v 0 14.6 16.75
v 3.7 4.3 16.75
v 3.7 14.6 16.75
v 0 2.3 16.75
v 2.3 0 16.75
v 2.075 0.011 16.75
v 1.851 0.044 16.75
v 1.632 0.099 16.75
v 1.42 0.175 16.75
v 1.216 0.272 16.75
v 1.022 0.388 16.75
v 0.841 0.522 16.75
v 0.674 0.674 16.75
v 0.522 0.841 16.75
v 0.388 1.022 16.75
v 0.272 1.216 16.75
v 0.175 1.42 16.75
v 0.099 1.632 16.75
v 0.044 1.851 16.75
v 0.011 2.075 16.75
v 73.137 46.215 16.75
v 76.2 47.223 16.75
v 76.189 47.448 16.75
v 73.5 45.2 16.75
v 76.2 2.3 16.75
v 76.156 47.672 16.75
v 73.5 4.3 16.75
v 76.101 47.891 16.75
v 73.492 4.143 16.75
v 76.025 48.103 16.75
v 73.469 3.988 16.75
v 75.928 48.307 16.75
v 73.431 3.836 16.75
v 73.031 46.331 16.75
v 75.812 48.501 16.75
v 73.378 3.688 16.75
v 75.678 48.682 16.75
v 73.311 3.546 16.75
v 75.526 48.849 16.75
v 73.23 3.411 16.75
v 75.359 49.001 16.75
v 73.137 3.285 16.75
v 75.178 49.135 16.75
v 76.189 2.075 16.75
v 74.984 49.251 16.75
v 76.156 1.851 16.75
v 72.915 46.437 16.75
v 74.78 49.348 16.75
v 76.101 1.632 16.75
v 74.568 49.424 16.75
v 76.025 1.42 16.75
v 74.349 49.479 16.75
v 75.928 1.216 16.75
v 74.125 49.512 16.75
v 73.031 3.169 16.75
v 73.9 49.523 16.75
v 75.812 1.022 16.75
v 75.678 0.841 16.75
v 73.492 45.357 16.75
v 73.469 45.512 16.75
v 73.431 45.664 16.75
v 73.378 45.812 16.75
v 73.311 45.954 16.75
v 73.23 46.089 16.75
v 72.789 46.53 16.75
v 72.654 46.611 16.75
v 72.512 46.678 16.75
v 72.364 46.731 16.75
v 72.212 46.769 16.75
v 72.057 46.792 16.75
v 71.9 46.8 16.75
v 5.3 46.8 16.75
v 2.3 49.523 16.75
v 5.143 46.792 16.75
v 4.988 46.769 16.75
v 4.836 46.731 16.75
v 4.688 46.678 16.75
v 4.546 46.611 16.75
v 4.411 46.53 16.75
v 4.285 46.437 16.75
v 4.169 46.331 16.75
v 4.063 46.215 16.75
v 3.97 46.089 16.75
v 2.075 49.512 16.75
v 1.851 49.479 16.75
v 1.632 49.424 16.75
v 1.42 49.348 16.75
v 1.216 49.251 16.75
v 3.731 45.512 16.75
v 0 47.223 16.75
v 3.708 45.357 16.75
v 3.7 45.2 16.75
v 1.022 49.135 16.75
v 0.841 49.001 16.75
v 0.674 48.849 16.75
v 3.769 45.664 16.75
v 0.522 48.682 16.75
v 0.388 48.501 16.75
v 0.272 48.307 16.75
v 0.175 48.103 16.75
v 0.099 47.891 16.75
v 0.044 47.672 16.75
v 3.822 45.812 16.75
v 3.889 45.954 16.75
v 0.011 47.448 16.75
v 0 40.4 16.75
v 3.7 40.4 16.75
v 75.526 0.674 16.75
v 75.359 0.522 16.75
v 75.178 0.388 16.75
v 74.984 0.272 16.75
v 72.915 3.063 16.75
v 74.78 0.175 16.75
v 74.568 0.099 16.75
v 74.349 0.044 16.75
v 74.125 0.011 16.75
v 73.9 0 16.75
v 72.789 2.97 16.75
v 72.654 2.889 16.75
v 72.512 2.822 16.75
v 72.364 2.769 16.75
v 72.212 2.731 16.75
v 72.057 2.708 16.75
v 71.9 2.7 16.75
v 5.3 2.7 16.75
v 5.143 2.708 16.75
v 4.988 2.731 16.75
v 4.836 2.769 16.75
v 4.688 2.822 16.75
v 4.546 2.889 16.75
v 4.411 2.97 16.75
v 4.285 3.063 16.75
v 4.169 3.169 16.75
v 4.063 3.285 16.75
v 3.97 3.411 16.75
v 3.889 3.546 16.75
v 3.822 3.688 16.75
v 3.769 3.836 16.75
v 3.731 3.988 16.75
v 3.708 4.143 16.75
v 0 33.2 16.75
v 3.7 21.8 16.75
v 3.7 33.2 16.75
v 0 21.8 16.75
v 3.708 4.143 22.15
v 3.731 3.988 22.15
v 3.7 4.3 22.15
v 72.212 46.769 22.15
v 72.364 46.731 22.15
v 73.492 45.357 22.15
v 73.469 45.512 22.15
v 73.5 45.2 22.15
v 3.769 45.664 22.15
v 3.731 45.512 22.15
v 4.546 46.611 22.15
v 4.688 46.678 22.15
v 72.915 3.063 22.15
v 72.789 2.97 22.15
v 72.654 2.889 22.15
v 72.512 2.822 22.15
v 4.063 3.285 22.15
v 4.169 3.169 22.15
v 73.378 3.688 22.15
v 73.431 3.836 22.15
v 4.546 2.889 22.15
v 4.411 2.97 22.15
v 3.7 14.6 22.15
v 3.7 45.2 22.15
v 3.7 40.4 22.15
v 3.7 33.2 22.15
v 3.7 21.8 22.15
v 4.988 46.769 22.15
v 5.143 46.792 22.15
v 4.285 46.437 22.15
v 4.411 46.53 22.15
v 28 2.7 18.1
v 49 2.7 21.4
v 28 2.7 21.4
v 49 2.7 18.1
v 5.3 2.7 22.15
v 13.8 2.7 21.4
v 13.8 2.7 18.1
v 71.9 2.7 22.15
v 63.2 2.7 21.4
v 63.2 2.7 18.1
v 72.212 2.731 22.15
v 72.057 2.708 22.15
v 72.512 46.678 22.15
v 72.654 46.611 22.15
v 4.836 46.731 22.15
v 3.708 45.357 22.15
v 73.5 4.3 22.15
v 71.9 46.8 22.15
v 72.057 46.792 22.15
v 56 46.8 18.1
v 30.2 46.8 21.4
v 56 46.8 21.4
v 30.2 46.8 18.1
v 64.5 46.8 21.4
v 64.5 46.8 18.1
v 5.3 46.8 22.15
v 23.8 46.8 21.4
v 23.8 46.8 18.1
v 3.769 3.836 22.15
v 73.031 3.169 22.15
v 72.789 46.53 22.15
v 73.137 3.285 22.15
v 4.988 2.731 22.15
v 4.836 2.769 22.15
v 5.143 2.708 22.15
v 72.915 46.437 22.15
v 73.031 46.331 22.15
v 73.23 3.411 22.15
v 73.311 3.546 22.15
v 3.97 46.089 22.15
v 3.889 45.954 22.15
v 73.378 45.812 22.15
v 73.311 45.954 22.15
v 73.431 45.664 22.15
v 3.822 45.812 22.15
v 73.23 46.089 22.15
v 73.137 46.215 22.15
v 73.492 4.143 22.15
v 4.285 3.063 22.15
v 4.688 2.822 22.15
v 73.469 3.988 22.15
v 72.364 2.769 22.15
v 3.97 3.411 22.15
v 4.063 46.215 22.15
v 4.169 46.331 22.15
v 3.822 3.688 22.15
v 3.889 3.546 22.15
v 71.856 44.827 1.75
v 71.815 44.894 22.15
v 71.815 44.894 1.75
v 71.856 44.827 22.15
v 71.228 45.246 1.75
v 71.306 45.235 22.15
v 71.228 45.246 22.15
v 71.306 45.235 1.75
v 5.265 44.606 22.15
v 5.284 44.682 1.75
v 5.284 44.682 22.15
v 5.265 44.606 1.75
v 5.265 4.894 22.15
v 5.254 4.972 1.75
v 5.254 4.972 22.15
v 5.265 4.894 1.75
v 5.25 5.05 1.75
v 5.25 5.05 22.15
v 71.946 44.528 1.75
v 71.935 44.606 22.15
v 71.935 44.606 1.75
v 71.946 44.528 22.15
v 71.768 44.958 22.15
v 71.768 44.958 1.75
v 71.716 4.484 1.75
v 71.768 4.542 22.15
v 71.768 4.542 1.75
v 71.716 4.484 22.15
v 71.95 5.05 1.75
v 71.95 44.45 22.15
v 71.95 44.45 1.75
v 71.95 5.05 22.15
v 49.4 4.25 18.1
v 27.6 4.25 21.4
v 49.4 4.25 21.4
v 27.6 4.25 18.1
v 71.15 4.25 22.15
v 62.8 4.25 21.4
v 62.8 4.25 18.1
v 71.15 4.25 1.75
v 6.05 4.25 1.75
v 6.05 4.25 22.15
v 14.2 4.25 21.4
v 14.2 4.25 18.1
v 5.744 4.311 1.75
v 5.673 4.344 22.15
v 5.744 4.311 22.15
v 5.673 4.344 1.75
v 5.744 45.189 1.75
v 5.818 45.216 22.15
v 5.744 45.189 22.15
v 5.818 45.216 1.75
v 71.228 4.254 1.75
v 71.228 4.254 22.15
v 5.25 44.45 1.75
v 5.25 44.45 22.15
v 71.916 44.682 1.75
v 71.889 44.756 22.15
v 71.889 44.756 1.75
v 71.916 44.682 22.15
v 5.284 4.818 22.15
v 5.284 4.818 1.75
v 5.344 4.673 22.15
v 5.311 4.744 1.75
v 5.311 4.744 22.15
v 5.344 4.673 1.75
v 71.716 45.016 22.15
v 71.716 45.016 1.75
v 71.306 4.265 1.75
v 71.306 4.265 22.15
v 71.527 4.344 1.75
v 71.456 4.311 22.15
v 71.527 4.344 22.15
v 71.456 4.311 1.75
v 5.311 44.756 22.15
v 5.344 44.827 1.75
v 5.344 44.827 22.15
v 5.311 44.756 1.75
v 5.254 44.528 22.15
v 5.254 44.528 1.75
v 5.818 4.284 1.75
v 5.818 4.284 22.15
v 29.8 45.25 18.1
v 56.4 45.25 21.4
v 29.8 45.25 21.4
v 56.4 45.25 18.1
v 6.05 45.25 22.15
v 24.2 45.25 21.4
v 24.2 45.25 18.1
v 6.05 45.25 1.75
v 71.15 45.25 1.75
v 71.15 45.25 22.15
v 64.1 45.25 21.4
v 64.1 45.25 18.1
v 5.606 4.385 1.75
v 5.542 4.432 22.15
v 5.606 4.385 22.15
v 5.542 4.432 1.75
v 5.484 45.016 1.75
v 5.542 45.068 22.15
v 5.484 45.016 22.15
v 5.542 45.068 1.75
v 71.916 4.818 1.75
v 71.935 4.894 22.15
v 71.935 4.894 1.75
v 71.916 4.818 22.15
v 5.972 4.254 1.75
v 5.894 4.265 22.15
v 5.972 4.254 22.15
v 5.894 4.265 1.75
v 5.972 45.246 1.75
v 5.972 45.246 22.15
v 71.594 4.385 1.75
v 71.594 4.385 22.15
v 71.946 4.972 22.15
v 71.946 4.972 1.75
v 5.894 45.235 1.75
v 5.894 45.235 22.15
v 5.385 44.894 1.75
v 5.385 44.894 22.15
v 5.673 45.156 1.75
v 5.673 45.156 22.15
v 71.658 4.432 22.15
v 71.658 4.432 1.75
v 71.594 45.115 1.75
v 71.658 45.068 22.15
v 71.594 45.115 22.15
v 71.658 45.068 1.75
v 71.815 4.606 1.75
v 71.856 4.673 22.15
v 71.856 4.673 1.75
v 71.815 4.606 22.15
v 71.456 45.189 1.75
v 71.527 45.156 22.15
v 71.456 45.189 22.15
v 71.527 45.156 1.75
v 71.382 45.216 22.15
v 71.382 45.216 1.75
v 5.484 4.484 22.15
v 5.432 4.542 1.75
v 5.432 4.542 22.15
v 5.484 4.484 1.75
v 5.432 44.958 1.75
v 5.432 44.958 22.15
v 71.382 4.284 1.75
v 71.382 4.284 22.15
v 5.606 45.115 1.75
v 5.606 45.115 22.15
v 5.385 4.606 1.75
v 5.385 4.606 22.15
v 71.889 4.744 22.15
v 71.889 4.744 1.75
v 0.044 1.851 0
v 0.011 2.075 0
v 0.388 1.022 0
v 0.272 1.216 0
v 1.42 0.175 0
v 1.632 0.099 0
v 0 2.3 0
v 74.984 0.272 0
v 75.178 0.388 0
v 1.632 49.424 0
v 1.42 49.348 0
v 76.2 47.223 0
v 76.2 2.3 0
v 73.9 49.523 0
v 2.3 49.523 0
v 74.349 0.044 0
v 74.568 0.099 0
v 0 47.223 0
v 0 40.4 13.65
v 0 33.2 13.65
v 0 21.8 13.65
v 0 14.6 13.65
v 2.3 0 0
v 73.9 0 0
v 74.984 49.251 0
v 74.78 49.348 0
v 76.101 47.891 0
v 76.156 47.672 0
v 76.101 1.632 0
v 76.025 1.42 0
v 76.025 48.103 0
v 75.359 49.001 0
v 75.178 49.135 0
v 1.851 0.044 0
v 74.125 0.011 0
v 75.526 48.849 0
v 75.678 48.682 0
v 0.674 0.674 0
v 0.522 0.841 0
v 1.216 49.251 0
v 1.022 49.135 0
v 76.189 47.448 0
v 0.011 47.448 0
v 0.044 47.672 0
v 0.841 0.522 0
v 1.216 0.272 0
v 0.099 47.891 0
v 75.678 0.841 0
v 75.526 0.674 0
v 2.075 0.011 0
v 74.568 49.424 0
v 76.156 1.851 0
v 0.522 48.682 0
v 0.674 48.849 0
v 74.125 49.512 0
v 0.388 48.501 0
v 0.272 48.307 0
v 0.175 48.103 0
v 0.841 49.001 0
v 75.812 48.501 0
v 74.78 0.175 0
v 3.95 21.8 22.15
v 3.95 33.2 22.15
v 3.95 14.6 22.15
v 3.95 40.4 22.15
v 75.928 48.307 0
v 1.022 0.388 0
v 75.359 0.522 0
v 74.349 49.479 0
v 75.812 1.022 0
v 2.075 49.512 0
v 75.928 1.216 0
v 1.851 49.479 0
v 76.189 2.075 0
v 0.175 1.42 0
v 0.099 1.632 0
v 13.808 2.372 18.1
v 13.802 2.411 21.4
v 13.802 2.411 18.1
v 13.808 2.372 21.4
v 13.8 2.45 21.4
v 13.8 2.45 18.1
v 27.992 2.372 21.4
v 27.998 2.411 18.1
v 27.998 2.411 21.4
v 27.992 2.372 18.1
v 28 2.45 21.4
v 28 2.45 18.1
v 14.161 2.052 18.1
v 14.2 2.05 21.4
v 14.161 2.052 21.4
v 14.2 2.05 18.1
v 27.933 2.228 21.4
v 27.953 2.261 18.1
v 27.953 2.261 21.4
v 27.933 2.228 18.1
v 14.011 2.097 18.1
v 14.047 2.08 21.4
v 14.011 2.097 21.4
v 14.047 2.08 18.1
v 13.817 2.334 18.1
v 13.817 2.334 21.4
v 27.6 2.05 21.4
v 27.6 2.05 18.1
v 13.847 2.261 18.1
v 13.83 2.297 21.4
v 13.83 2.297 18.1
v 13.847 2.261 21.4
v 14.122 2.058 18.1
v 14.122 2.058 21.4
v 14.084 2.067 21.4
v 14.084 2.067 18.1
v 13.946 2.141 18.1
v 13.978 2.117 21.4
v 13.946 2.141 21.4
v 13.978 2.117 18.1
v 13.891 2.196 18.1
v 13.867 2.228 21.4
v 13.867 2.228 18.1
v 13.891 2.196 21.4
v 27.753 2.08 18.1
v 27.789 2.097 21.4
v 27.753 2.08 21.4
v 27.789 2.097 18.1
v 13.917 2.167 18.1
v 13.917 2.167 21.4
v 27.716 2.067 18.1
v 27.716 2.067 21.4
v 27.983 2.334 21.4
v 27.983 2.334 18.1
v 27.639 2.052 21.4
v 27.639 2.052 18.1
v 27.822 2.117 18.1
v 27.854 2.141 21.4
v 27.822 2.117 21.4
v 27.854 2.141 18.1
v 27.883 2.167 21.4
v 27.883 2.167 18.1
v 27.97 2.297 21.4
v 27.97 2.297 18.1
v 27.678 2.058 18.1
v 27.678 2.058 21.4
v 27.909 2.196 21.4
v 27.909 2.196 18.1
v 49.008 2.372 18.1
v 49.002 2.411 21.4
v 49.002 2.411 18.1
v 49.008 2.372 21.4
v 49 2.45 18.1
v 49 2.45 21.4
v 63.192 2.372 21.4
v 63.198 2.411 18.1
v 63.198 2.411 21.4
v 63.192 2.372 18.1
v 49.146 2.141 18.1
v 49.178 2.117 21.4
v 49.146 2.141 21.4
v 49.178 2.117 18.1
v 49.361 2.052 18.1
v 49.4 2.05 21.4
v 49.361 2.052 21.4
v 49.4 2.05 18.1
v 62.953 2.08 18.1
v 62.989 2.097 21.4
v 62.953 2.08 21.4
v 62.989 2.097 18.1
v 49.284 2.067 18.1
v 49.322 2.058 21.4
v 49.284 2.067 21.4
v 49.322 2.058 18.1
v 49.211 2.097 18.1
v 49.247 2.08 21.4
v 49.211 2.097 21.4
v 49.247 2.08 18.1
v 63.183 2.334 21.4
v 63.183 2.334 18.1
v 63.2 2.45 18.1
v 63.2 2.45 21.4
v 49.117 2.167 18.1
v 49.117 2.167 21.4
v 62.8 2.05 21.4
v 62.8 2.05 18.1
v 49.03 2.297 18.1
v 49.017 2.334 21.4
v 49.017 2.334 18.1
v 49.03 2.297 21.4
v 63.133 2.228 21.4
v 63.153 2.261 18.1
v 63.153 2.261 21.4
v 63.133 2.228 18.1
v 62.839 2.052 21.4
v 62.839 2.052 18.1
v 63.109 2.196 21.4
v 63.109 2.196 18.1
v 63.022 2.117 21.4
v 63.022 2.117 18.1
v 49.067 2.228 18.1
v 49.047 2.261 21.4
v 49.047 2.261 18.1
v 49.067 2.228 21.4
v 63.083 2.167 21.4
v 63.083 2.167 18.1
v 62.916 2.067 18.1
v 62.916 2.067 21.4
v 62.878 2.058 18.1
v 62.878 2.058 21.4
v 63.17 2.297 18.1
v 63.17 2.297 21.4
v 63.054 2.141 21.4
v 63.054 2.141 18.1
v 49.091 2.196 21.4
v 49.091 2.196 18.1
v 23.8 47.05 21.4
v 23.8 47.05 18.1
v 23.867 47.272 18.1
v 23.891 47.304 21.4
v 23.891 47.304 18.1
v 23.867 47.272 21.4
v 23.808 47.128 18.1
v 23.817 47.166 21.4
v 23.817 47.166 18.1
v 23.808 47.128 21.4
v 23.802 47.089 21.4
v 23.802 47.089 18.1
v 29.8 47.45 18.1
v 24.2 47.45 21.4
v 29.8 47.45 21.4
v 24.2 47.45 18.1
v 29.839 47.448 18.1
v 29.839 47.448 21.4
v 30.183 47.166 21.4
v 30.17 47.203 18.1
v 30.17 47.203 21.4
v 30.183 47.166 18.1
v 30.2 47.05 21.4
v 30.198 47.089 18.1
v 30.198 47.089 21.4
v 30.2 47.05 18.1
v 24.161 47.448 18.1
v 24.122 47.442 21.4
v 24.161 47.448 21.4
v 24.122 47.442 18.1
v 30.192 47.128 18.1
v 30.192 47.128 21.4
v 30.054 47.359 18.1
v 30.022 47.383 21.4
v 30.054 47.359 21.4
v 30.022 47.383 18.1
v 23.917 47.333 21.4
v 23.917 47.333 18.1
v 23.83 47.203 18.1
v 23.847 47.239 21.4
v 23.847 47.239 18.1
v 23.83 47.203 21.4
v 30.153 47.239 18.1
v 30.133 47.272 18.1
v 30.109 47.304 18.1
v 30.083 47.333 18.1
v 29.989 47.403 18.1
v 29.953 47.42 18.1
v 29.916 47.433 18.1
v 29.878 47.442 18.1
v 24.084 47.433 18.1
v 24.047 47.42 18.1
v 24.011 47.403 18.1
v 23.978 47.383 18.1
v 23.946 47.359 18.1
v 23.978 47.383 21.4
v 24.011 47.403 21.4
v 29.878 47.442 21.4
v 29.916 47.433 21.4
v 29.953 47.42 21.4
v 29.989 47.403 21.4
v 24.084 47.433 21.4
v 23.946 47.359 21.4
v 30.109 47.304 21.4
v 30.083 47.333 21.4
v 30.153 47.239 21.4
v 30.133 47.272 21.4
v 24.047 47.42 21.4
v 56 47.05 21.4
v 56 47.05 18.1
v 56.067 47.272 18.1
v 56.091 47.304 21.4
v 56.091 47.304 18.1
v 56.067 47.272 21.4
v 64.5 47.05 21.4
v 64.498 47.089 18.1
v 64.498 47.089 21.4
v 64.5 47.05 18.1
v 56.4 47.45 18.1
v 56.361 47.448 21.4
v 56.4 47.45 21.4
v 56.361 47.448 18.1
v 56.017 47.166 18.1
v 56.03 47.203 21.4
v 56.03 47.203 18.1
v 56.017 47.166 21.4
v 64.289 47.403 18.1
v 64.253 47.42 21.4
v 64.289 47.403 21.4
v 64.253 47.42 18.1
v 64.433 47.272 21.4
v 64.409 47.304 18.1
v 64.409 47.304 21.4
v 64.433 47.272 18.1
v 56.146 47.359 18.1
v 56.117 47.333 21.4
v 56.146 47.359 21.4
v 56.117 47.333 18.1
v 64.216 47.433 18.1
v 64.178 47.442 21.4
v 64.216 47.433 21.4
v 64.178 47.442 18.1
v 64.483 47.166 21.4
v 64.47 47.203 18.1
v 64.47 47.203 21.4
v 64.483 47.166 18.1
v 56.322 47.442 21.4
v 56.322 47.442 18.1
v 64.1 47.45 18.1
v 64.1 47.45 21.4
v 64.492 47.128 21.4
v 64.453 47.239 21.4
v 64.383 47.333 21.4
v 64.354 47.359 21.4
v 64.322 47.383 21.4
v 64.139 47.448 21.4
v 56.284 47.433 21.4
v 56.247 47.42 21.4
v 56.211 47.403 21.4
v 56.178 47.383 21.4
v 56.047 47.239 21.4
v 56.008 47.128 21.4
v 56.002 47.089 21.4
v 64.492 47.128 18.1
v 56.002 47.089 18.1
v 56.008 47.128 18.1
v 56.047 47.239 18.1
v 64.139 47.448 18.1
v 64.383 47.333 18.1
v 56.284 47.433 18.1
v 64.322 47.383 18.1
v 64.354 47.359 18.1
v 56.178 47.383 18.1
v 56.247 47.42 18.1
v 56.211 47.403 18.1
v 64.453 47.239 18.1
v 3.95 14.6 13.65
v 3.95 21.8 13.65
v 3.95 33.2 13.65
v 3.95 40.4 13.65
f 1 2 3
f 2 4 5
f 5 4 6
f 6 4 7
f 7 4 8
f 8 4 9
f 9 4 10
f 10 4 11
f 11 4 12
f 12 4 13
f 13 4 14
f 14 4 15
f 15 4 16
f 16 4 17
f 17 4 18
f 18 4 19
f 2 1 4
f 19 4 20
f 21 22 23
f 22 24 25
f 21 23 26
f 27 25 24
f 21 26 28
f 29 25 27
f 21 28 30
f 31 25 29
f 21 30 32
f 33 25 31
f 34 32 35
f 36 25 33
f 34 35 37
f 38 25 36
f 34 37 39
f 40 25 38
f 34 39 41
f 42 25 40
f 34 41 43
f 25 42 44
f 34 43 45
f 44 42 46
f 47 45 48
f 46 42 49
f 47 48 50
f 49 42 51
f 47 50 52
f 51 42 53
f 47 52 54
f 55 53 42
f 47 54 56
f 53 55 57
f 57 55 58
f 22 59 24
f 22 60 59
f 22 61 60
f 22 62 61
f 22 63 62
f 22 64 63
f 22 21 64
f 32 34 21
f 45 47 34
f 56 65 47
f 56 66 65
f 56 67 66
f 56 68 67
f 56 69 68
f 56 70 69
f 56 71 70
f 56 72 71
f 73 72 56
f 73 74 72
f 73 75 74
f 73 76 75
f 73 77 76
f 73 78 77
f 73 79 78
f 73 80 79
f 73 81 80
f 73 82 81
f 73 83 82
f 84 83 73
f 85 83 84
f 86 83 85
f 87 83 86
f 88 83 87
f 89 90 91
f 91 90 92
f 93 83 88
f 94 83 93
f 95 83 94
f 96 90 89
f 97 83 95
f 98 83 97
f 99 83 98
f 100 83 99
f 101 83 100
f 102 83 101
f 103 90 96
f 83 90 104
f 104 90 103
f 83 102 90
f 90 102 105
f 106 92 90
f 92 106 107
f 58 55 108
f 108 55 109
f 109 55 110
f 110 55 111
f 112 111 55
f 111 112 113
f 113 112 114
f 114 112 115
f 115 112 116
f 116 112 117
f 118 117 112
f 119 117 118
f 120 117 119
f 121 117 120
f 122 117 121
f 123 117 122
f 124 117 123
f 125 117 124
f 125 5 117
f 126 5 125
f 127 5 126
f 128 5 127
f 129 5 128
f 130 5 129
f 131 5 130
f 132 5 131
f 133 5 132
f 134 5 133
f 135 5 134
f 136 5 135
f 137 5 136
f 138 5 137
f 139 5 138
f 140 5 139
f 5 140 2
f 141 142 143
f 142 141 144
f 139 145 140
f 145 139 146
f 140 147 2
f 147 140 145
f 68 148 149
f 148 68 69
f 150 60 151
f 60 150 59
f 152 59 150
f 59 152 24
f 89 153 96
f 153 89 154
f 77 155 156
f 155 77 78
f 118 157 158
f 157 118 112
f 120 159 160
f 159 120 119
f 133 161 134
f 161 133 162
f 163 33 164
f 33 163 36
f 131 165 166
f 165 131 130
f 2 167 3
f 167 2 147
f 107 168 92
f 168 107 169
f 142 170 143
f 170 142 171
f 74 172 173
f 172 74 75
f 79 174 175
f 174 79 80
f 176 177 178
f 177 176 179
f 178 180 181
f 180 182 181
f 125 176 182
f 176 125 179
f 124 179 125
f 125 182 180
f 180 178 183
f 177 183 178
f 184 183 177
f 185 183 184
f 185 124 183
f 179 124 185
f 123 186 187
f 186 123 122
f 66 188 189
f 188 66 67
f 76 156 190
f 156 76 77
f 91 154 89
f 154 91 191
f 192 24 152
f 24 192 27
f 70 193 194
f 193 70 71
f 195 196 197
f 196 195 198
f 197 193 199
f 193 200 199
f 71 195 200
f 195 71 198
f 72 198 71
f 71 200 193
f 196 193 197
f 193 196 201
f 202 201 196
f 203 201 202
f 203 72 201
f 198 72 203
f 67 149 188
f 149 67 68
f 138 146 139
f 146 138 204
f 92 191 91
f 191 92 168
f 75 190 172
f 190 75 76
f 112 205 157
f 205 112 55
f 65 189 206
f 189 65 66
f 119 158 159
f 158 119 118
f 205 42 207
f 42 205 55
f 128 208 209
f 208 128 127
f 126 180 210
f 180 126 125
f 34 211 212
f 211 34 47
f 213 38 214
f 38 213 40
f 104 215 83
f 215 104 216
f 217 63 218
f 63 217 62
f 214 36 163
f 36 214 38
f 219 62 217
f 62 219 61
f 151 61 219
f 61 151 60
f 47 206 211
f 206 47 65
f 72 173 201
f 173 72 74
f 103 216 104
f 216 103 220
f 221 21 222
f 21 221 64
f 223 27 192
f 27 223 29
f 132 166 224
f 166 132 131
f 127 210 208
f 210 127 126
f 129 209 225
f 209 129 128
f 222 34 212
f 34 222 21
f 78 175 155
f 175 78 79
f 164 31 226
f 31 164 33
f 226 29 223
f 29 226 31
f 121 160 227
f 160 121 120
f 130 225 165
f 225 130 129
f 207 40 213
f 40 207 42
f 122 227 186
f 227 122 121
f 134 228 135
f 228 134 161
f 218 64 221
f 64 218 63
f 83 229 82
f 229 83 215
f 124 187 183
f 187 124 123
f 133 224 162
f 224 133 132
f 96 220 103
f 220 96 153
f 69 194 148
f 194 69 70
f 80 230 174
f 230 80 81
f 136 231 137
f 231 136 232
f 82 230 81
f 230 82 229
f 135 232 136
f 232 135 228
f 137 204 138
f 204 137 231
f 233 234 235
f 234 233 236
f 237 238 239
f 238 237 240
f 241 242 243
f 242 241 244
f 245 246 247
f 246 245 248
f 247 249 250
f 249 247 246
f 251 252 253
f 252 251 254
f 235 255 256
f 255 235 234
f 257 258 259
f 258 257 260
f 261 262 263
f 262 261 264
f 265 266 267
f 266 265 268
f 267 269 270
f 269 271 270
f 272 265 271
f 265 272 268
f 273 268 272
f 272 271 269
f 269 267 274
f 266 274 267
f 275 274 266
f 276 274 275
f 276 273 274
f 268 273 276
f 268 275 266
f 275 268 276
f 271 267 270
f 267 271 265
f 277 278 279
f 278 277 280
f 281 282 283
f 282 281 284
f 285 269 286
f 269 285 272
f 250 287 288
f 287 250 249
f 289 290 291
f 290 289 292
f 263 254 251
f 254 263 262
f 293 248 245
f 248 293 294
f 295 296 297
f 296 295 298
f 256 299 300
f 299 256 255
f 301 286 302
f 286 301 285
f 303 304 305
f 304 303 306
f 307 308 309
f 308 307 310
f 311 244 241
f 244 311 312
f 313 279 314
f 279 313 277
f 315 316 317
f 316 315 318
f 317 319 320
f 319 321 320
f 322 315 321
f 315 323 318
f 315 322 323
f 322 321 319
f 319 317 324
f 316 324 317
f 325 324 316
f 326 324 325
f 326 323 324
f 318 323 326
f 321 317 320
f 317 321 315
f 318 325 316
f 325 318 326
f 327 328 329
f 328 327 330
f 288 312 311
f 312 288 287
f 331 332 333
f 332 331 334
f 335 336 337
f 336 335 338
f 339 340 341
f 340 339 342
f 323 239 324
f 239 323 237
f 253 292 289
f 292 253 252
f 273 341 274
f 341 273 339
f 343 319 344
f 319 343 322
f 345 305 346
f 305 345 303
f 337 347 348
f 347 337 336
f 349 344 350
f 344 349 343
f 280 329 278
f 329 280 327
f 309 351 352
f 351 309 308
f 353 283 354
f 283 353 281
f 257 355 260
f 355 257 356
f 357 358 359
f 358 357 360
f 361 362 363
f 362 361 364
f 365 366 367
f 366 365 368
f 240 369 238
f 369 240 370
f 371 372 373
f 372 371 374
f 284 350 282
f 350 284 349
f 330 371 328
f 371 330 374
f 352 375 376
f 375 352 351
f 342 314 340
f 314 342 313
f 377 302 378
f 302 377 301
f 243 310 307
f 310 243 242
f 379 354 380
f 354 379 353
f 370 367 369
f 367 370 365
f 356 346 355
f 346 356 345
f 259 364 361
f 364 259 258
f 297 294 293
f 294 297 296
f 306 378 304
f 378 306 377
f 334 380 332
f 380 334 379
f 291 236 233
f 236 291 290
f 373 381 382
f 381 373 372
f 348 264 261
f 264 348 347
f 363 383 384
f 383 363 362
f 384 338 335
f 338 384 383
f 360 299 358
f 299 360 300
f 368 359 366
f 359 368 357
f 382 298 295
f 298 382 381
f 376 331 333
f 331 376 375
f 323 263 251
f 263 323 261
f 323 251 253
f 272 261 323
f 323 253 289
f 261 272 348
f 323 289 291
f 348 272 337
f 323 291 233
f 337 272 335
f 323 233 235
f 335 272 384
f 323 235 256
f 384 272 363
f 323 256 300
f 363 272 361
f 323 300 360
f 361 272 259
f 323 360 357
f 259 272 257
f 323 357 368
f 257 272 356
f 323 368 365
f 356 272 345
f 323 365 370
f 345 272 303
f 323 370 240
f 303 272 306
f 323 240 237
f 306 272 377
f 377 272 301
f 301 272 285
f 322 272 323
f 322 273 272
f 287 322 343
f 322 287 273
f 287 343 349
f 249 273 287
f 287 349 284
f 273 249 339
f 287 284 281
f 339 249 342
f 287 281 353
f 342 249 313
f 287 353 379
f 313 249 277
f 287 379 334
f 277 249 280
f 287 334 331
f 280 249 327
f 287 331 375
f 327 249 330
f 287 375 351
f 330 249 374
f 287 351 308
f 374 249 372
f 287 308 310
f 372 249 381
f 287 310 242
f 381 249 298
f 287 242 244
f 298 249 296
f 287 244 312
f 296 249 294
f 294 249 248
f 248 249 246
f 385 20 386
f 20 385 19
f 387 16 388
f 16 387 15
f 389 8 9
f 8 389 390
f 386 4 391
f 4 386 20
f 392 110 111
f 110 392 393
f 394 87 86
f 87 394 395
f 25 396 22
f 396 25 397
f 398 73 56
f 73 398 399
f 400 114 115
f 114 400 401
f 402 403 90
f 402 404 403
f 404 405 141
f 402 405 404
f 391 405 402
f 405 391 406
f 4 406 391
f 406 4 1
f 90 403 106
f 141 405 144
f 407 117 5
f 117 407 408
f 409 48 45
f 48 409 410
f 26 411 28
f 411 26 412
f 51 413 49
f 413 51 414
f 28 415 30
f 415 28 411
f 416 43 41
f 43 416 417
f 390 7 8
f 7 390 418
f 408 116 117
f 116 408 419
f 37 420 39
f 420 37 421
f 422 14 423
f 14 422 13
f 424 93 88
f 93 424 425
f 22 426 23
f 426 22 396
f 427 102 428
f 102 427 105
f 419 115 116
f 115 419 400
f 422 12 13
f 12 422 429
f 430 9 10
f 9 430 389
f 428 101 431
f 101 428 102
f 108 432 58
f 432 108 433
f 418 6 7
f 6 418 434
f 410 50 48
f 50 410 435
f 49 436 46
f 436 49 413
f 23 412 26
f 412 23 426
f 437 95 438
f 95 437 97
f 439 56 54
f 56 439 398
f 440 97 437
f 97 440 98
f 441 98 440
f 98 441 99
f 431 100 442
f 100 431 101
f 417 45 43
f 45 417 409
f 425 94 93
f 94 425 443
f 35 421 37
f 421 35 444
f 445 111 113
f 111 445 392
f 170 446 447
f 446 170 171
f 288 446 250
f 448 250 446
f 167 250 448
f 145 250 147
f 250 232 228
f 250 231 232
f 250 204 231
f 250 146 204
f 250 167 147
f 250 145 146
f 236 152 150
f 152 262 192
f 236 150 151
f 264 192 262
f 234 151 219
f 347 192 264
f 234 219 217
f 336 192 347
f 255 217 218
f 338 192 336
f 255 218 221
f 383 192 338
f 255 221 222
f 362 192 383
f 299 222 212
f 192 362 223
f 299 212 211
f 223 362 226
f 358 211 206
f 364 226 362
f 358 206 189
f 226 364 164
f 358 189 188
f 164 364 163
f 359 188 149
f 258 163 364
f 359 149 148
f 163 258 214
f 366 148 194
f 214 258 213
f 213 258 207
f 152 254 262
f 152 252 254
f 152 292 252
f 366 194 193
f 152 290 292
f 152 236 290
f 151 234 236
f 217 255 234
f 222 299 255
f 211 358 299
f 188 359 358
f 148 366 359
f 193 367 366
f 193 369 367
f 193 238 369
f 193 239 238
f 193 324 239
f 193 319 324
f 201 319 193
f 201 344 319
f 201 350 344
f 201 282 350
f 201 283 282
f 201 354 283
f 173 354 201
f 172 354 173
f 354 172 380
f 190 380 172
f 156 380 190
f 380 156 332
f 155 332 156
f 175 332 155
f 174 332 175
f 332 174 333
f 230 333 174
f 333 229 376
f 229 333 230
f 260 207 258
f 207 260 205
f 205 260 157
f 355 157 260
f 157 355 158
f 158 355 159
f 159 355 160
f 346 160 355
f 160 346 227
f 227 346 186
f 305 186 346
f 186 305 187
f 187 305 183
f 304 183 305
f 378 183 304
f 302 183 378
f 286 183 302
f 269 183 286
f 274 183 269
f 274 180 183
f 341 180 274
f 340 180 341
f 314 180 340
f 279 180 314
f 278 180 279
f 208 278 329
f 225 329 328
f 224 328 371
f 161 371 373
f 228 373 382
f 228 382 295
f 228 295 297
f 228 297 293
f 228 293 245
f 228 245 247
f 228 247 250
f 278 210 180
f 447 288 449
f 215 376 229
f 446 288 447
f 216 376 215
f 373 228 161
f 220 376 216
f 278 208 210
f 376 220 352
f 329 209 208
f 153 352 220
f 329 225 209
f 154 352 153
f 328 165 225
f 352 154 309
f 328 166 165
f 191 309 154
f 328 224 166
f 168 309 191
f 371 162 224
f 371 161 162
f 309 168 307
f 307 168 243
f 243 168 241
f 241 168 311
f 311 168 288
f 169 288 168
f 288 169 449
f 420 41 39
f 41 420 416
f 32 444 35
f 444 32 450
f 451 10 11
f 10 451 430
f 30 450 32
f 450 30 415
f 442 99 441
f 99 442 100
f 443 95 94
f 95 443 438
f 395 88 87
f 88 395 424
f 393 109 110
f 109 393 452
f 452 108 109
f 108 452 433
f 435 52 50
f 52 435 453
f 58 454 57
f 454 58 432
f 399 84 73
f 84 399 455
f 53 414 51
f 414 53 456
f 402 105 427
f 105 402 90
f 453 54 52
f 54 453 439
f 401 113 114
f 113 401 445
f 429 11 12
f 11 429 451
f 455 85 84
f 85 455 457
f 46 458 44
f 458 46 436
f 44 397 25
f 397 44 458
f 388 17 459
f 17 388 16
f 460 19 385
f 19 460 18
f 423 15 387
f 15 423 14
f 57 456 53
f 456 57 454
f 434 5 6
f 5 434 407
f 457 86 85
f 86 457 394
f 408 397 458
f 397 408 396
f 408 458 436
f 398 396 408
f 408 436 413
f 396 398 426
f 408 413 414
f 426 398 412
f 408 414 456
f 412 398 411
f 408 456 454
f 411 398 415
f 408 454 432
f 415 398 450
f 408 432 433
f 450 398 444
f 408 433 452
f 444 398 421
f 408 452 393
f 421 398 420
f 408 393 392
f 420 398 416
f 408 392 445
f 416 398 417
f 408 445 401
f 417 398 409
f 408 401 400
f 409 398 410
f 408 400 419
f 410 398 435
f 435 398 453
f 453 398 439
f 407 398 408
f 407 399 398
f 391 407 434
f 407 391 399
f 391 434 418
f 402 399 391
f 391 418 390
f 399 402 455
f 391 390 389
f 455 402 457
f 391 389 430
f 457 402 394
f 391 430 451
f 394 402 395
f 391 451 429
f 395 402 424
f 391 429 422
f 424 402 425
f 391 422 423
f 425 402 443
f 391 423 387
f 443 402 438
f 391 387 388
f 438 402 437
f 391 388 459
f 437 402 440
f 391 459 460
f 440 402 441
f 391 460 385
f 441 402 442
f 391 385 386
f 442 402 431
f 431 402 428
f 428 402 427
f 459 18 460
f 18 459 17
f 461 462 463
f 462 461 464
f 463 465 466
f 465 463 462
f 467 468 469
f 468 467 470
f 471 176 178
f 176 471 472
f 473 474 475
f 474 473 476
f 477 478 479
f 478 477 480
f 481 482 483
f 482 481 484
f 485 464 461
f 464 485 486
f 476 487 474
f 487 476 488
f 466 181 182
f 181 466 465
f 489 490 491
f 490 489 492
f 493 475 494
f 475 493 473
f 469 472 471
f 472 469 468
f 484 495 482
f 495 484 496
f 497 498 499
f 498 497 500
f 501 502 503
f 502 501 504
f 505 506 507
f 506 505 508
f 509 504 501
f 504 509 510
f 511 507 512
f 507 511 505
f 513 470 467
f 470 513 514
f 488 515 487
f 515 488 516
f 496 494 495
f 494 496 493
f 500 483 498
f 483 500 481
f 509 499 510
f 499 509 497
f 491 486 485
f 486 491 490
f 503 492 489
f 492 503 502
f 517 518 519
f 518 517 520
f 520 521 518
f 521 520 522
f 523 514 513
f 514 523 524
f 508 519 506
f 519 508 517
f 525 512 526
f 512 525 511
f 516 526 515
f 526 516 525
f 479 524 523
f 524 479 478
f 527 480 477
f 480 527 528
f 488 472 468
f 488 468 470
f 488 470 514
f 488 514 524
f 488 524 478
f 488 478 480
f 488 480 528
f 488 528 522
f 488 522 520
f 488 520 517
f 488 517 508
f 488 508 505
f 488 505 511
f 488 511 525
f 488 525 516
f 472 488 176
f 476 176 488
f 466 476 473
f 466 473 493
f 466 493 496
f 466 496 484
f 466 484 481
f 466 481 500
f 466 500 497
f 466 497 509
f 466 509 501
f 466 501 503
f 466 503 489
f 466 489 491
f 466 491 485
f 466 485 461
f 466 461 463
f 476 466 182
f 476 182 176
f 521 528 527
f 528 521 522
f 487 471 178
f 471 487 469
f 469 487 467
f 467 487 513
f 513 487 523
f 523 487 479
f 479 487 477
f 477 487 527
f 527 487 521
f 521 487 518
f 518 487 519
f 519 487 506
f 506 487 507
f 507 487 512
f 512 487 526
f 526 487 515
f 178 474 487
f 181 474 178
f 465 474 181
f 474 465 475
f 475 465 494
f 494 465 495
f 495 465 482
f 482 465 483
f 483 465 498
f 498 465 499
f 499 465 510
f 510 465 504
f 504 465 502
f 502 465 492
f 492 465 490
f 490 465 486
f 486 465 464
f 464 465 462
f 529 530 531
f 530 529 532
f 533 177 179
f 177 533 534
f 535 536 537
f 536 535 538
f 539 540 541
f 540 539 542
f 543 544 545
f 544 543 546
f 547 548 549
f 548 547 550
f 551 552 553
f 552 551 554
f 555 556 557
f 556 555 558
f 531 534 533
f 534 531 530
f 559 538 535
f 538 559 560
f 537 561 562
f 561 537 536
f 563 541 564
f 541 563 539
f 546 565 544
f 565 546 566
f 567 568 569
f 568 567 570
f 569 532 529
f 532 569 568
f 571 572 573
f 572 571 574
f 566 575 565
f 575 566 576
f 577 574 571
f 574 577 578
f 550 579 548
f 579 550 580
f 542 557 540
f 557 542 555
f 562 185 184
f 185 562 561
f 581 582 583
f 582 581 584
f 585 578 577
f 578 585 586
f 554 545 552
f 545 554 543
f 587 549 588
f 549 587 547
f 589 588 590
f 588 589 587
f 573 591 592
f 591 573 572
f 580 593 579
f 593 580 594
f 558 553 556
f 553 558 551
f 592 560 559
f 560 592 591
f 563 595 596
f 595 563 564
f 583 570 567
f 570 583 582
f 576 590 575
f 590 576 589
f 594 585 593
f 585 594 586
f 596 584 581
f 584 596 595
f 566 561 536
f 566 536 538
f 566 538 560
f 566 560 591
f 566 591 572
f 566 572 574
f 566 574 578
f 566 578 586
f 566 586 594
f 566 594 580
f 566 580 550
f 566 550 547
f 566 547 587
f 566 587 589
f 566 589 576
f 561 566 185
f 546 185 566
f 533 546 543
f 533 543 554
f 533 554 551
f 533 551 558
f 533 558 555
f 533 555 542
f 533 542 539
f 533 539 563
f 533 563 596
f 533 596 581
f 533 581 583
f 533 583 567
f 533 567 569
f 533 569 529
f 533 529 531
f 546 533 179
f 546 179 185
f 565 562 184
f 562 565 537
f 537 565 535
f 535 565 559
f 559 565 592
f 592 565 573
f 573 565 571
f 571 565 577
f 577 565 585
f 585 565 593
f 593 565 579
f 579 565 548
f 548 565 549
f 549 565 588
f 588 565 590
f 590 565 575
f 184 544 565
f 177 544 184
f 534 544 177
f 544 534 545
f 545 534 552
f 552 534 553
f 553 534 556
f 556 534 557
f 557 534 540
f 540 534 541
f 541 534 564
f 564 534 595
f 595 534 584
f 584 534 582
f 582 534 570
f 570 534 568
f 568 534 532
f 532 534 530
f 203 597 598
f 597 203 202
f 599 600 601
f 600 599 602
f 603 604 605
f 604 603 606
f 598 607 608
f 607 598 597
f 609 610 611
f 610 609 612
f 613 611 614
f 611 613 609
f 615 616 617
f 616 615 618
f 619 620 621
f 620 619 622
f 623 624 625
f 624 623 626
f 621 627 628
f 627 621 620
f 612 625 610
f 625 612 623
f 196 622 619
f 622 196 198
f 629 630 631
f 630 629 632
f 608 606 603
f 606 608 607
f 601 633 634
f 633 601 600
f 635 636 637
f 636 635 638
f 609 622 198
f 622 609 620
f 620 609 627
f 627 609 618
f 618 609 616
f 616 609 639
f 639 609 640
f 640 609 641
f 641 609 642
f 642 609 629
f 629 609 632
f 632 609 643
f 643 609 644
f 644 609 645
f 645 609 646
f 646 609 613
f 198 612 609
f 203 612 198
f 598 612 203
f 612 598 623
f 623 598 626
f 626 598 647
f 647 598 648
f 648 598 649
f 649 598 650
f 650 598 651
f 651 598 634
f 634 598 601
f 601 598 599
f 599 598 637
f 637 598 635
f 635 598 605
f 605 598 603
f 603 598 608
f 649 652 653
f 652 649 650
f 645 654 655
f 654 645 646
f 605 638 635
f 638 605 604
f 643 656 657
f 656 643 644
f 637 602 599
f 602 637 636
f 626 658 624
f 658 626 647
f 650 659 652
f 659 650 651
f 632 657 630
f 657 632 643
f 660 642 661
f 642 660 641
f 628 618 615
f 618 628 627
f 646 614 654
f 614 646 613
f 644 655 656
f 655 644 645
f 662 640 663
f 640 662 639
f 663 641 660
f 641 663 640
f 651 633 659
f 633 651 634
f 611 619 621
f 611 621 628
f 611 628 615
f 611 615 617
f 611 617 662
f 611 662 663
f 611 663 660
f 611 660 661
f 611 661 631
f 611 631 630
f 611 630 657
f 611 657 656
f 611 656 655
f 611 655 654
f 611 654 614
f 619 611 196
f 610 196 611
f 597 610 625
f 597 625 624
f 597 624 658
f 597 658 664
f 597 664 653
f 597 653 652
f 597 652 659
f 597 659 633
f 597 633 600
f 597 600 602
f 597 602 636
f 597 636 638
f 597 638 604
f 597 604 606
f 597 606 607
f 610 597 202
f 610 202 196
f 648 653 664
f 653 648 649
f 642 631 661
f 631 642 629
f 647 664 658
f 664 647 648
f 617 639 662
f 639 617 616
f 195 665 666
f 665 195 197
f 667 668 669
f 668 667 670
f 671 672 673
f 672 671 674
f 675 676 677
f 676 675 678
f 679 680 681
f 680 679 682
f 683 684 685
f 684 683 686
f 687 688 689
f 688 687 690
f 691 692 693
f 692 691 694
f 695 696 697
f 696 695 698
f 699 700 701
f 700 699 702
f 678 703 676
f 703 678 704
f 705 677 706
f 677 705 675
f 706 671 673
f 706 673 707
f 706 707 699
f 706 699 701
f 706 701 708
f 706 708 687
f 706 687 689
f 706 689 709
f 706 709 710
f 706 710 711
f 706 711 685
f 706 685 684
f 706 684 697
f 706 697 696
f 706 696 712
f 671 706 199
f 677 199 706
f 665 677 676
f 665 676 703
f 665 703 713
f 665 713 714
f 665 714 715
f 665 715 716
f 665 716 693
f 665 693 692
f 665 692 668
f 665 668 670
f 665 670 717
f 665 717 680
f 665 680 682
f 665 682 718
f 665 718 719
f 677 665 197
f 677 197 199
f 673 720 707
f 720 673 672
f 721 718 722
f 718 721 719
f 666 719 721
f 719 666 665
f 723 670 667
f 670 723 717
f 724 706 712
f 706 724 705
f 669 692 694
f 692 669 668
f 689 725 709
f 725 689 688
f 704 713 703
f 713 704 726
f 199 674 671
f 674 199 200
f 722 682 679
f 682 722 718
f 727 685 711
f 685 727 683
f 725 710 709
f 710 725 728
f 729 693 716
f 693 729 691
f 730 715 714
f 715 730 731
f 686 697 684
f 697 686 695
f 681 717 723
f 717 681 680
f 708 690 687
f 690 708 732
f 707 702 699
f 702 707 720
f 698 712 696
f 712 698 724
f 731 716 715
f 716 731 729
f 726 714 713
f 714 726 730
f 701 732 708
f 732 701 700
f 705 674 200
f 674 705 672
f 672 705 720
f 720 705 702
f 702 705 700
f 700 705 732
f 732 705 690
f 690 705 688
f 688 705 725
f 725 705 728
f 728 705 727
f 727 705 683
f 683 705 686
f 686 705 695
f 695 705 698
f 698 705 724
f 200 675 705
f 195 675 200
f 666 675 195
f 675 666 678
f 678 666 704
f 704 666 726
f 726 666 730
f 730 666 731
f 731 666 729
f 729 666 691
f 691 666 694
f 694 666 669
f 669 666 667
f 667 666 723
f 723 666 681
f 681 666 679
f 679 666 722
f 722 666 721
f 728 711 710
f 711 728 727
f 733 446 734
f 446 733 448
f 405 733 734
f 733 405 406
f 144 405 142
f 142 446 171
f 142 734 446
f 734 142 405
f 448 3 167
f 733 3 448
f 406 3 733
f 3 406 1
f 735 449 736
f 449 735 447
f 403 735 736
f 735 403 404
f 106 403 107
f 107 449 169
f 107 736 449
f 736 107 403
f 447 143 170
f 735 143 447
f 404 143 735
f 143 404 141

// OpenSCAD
/**
 * TTGO-TM ESP32 ("TMusic") - BASE TRAY
 * Parametric constructive rebuild from ttgo-cap-2.stl.
 *
 * The source file uses "cap", but the part is the deep base tray. This model
 * starts with the overall rounded bounding block, removes the main cavity and
 * rim rabbet as named negative cutouts, and adds discrete support/lug blocks
 * observed in high-Z mesh cross-sections.
 *
 * Coordinate System:
 *   X = Width  (positive = right)
 *   Y = Depth  (positive = back/away from viewer)
 *   Z = Height (positive = up)
 *
 * Origin: Front-left-bottom corner of the normalized tray bounding box.
 *
 * ===========================================
 * COMPONENT INDEX
 * ===========================================
 *
 * | Component                     | Origin [X,Y,Z] | Size [W,D,H]        | Attaches To      |
 * |-------------------------------|----------------|---------------------|------------------|
 * | base_tray_outer_block         | [0,0,0]        | [76.2,49.523,22.15] | ground / print   |
 * | base_tray_inner_cavity        | [5.25,4.25,1.75]| [66.7,41.0,thru]   | negative cutout  |
 * | base_tray_rim_rabbet          | top perimeter  | 5.4 high            | bezel skirt      |
 * | support_lugs (x4)             | inner rim      | variable            | PCB / latch area |
 * | left_wall_connector_reliefs   | left wall      | variable            | negative cutout  |
 */

// ===========================================
// DIMENSIONS (all values in millimeters)
// ===========================================

// --- Source mesh facts ---
source_cap_mesh_file = "ttgo-cap-2.stl";
source_cap_bbox_min_mm = [-36.675, -44.4235, -20.290];
source_cap_bbox_max_mm = [ 39.525,   5.1000,   1.860];
source_cap_bbox_size_mm = [76.200, 49.5235, 22.150];
source_cap_face_count = 54112;

// --- Global / shared case dimensions ---
case_width_mm = 76.200;
case_depth_mm = 49.523;
case_corner_radius_mm = 2.300;
case_inner_corner_radius_mm = 0.800;
case_wall_thickness_mm = 2.500;
case_fit_clearance_xy_mm = 0.250;
case_fit_clearance_z_mm = 0.200;
case_epsilon_mm = 0.050;
case_cut_overshoot_mm = 0.500;

// --- base_tray_outer_block dimensions ---
base_tray_height_mm = 22.150;
base_tray_floor_thickness_mm = 1.750;

// --- base_tray_inner_cavity_cutout dimensions ---
base_tray_inner_cavity_x_mm = 5.250;
base_tray_inner_cavity_y_mm = 4.250;
base_tray_inner_cavity_width_mm = 66.700;
base_tray_inner_cavity_depth_mm = 41.000;

// --- base_tray_rim_rabbet_cutout dimensions ---
base_tray_rim_height_mm = 5.400;
base_tray_rim_inset_x_mm = 3.700;
base_tray_rim_inset_y_mm = 2.700;
base_tray_rim_width_mm = 69.800;
base_tray_rim_depth_mm = 44.100;
base_tray_rim_corner_radius_mm = 1.600;

// --- support_lugs dimensions ---
support_lug_height_mm = 3.300;
support_lug_z_mm = 18.100;
support_lug_depth_mm = 2.200;
support_lug_corner_radius_mm = 0.400;
front_support_lug_specs_mm = [
    [13.800, 14.200],
    [49.000, 14.200]
];
rear_support_lug_specs_mm = [
    [23.800,  6.400],
    [56.000,  8.500]
];

// --- left_wall_connector_relief_cutouts dimensions ---
left_wall_relief_x_mm = -case_epsilon_mm;
left_wall_relief_width_mm = 4.000;
left_wall_relief_height_mm = 8.500;
left_wall_relief_z_mm = base_tray_height_mm - left_wall_relief_height_mm;
left_wall_relief_depth_mm = 7.200;
left_wall_relief_centers_y_mm = [18.200, 36.800];

$fn = 64;

// ===========================================
// HELPERS
// ===========================================

module rounded_rect_2d(width_mm, depth_mm, radius_mm) {
    effective_radius_mm = min(radius_mm, min(width_mm, depth_mm) / 2);
    hull() {
        translate([effective_radius_mm, effective_radius_mm])
            circle(r = effective_radius_mm);
        translate([width_mm - effective_radius_mm, effective_radius_mm])
            circle(r = effective_radius_mm);
        translate([effective_radius_mm, depth_mm - effective_radius_mm])
            circle(r = effective_radius_mm);
        translate([width_mm - effective_radius_mm, depth_mm - effective_radius_mm])
            circle(r = effective_radius_mm);
    }
}

module rounded_box(width_mm, depth_mm, height_mm, radius_mm) {
    linear_extrude(height = height_mm)
        rounded_rect_2d(width_mm, depth_mm, radius_mm);
}

// ===========================================
// POSITIVE GEOMETRY
// ===========================================

/**
 * Base Tray Outer Block
 *
 * POSITION:
 *   Origin: [0,0,0]
 *
 * BOUNDING BOX:
 *   Min: [0,0,0]
 *   Max: [76.2,49.523,22.15]
 *
 * ALIGNMENT:
 *   The normalized source mesh bounding-box minimum maps to this origin.
 *
 * CONNECTS TO:
 *   - top bezel skirt through the rim rabbet.
 */
module base_tray_outer_block() {
    rounded_box(case_width_mm, case_depth_mm, base_tray_height_mm,
                case_corner_radius_mm);
}

/**
 * Base Tray Support Lugs
 *
 * POSITION:
 *   Four discrete raised blocks near the upper inner rim.
 *
 * BOUNDING BOX:
 *   z range: [18.1,21.4].
 *
 * ALIGNMENT:
 *   The blocks are added after the cavity/rabbet are cut so they remain as
 *   functional pads inside the tray.
 *
 * CONNECTS TO:
 *   - PCB edge / bezel latch region inferred from source sections.
 */
module base_tray_support_lugs_positive() {
    for (lug_spec = front_support_lug_specs_mm) {
        translate([lug_spec[0],
                   base_tray_inner_cavity_y_mm - support_lug_depth_mm,
                   support_lug_z_mm])
            rounded_box(lug_spec[1],
                        support_lug_depth_mm,
                        support_lug_height_mm,
                        support_lug_corner_radius_mm);
    }

    for (lug_spec = rear_support_lug_specs_mm) {
        translate([lug_spec[0],
                   base_tray_inner_cavity_y_mm + base_tray_inner_cavity_depth_mm,
                   support_lug_z_mm])
            rounded_box(lug_spec[1],
                        support_lug_depth_mm,
                        support_lug_height_mm,
                        support_lug_corner_radius_mm);
    }
}

// ===========================================
// NEGATIVE CUTOUTS
// ===========================================

module base_tray_shell_negative_cutouts() {
    base_tray_inner_cavity_cutout();
    base_tray_rim_rabbet_cutout();
}

module base_tray_final_negative_cutouts() {
    base_tray_left_wall_connector_relief_cutouts();
}

/**
 * Inner Cavity Cutout
 *
 * POSITION:
 *   Origin: [5.25,4.25,1.75]
 *
 * BOUNDING BOX:
 *   Min: [5.25,4.25,1.75]
 *   Max: [71.95,45.25,22.65]
 *
 * ALIGNMENT:
 *   Removes the main electronics cavity and leaves the measured floor.
 *
 * CONNECTS TO:
 *   - board/battery volume.
 */
module base_tray_inner_cavity_cutout() {
    translate([base_tray_inner_cavity_x_mm,
               base_tray_inner_cavity_y_mm,
               base_tray_floor_thickness_mm])
        rounded_box(base_tray_inner_cavity_width_mm,
                    base_tray_inner_cavity_depth_mm,
                    base_tray_height_mm - base_tray_floor_thickness_mm + case_cut_overshoot_mm,
                    case_inner_corner_radius_mm);
}

/**
 * Rim Rabbet Cutout
 *
 * POSITION:
 *   Top perimeter, z starts at base_tray_height_mm - base_tray_rim_height_mm.
 *
 * BOUNDING BOX:
 *   Removes the exterior top ring outside the inset rim footprint.
 *
 * ALIGNMENT:
 *   Produces the approximately 5.4 mm high ledge that accepts the bezel skirt.
 *
 * CONNECTS TO:
 *   - top_bezel_skirt_outer_size_mm with named XY/Z clearance.
 */
module base_tray_rim_rabbet_cutout() {
    difference() {
        translate([-case_epsilon_mm,
                   -case_epsilon_mm,
                   base_tray_height_mm - base_tray_rim_height_mm])
            rounded_box(case_width_mm + 2 * case_epsilon_mm,
                        case_depth_mm + 2 * case_epsilon_mm,
                        base_tray_rim_height_mm + case_cut_overshoot_mm,
                        case_corner_radius_mm);

        translate([base_tray_rim_inset_x_mm,
                   base_tray_rim_inset_y_mm,
                   base_tray_height_mm - base_tray_rim_height_mm - case_epsilon_mm])
            rounded_box(base_tray_rim_width_mm,
                        base_tray_rim_depth_mm,
                        base_tray_rim_height_mm + case_cut_overshoot_mm,
                        base_tray_rim_corner_radius_mm);
    }
}

/**
 * Left Wall Connector Relief Cutouts
 *
 * POSITION:
 *   Two vertical wall interruptions on the left side, matching the high-Z
 *   source section features.
 *
 * BOUNDING BOX:
 *   Each relief cuts through the left wall at the upper rim height.
 *
 * ALIGNMENT:
 *   These are modeled as functional access/clearance reliefs rather than
 *   mesh-faithful organic surfaces.
 *
 * CONNECTS TO:
 *   - connector/cable clearance along the left wall.
 */
module base_tray_left_wall_connector_relief_cutouts() {
    for (center_y_mm = left_wall_relief_centers_y_mm) {
        translate([left_wall_relief_x_mm,
                   center_y_mm - left_wall_relief_depth_mm / 2,
                   left_wall_relief_z_mm])
            cube([left_wall_relief_width_mm,
                  left_wall_relief_depth_mm,
                  left_wall_relief_height_mm + case_cut_overshoot_mm]);
    }
}

// ===========================================
// MAIN ASSEMBLY
// ===========================================

module base_tray_cut_shell() {
    difference() {
        base_tray_outer_block();
        base_tray_shell_negative_cutouts();
    }
}

/**
 * TTGO Base Tray
 *
 * Combines the cut shell with the discrete support lugs, then applies the
 * final wall relief cuts.
 */
module ttgo_base_tray() {
    difference() {
        union() {
            base_tray_cut_shell();
            base_tray_support_lugs_positive();
        }
        base_tray_final_negative_cutouts();
    }
}

// Backward-compatible module name used by earlier docs/builds.
module ttgo_cap() {
    ttgo_base_tray();
}

// ===========================================
// CONNECTION INTERFACES
// ===========================================

function base_tray_outer_size_mm() =
    [case_width_mm, case_depth_mm, base_tray_height_mm];

function base_tray_rim_center_mm() =
    [case_width_mm / 2, case_depth_mm / 2, base_tray_height_mm];

function base_tray_rim_seat_size_mm() =
    [base_tray_rim_width_mm - 2 * case_fit_clearance_xy_mm,
     base_tray_rim_depth_mm - 2 * case_fit_clearance_xy_mm,
     base_tray_rim_height_mm - case_fit_clearance_z_mm];

function base_tray_inner_cavity_size_mm() =
    [base_tray_inner_cavity_width_mm,
     base_tray_inner_cavity_depth_mm,
     base_tray_height_mm - base_tray_floor_thickness_mm];

// ===========================================
// DEBUG / VALIDATION
// ===========================================

module debug_axes(length_mm = 50) {
    color("red")   cylinder(h = length_mm, r = 1, $fn = 16);
    color("green") rotate([0, 90, 0]) cylinder(h = length_mm, r = 1, $fn = 16);
    color("blue")  rotate([-90, 0, 0]) cylinder(h = length_mm, r = 1, $fn = 16);
}

module debug_bounds() {
    color("yellow", 0.2)
        cube(base_tray_outer_size_mm());
}

module debug_positive_only() {
    color("lightgray") base_tray_outer_block();
    color("darkgray") base_tray_support_lugs_positive();
}

module debug_negative_only() {
    color("crimson", 0.35) {
        base_tray_shell_negative_cutouts();
        base_tray_final_negative_cutouts();
    }
}

module debug_cutouts() {
    color("lightgray", 0.25) base_tray_outer_block();
    color("darkgray", 0.35) base_tray_support_lugs_positive();
    debug_negative_only();
}

module debug_section_x(x_mm = case_width_mm / 2) {
    intersection() {
        ttgo_base_tray();
        translate([x_mm - case_epsilon_mm, -case_epsilon_mm, -case_epsilon_mm])
            cube([2 * case_epsilon_mm,
                  case_depth_mm + 2 * case_epsilon_mm,
                  base_tray_height_mm + 2 * case_epsilon_mm]);
    }
}

module debug_section_y(y_mm = case_depth_mm / 2) {
    intersection() {
        ttgo_base_tray();
        translate([-case_epsilon_mm, y_mm - case_epsilon_mm, -case_epsilon_mm])
            cube([case_width_mm + 2 * case_epsilon_mm,
                  2 * case_epsilon_mm,
                  base_tray_height_mm + 2 * case_epsilon_mm]);
    }
}

module validation_source_mesh() {
    translate(-source_cap_bbox_min_mm)
        import(source_cap_mesh_file, convexity = 10);
}

module validation_overlay() {
    color("gray", 0.55) ttgo_base_tray();
    color("orange", 0.25) validation_source_mesh();
}

module assembly_colored() {
    color("gray") ttgo_base_tray();
}

module assembly_exploded(separation_mm = 30) {
    translate([0, 0, 0]) ttgo_base_tray();
}

// ===========================================
// DEFAULT RENDER
// ===========================================

render_mode = "model"; // model, overlay, cutouts, positive, section_x, section_y

if (render_mode == "overlay") {
    validation_overlay();
} else if (render_mode == "cutouts") {
    debug_cutouts();
} else if (render_mode == "positive") {
    debug_positive_only();
} else if (render_mode == "section_x") {
    debug_section_x();
} else if (render_mode == "section_y") {
    debug_section_y();
} else {
    ttgo_base_tray();
}
